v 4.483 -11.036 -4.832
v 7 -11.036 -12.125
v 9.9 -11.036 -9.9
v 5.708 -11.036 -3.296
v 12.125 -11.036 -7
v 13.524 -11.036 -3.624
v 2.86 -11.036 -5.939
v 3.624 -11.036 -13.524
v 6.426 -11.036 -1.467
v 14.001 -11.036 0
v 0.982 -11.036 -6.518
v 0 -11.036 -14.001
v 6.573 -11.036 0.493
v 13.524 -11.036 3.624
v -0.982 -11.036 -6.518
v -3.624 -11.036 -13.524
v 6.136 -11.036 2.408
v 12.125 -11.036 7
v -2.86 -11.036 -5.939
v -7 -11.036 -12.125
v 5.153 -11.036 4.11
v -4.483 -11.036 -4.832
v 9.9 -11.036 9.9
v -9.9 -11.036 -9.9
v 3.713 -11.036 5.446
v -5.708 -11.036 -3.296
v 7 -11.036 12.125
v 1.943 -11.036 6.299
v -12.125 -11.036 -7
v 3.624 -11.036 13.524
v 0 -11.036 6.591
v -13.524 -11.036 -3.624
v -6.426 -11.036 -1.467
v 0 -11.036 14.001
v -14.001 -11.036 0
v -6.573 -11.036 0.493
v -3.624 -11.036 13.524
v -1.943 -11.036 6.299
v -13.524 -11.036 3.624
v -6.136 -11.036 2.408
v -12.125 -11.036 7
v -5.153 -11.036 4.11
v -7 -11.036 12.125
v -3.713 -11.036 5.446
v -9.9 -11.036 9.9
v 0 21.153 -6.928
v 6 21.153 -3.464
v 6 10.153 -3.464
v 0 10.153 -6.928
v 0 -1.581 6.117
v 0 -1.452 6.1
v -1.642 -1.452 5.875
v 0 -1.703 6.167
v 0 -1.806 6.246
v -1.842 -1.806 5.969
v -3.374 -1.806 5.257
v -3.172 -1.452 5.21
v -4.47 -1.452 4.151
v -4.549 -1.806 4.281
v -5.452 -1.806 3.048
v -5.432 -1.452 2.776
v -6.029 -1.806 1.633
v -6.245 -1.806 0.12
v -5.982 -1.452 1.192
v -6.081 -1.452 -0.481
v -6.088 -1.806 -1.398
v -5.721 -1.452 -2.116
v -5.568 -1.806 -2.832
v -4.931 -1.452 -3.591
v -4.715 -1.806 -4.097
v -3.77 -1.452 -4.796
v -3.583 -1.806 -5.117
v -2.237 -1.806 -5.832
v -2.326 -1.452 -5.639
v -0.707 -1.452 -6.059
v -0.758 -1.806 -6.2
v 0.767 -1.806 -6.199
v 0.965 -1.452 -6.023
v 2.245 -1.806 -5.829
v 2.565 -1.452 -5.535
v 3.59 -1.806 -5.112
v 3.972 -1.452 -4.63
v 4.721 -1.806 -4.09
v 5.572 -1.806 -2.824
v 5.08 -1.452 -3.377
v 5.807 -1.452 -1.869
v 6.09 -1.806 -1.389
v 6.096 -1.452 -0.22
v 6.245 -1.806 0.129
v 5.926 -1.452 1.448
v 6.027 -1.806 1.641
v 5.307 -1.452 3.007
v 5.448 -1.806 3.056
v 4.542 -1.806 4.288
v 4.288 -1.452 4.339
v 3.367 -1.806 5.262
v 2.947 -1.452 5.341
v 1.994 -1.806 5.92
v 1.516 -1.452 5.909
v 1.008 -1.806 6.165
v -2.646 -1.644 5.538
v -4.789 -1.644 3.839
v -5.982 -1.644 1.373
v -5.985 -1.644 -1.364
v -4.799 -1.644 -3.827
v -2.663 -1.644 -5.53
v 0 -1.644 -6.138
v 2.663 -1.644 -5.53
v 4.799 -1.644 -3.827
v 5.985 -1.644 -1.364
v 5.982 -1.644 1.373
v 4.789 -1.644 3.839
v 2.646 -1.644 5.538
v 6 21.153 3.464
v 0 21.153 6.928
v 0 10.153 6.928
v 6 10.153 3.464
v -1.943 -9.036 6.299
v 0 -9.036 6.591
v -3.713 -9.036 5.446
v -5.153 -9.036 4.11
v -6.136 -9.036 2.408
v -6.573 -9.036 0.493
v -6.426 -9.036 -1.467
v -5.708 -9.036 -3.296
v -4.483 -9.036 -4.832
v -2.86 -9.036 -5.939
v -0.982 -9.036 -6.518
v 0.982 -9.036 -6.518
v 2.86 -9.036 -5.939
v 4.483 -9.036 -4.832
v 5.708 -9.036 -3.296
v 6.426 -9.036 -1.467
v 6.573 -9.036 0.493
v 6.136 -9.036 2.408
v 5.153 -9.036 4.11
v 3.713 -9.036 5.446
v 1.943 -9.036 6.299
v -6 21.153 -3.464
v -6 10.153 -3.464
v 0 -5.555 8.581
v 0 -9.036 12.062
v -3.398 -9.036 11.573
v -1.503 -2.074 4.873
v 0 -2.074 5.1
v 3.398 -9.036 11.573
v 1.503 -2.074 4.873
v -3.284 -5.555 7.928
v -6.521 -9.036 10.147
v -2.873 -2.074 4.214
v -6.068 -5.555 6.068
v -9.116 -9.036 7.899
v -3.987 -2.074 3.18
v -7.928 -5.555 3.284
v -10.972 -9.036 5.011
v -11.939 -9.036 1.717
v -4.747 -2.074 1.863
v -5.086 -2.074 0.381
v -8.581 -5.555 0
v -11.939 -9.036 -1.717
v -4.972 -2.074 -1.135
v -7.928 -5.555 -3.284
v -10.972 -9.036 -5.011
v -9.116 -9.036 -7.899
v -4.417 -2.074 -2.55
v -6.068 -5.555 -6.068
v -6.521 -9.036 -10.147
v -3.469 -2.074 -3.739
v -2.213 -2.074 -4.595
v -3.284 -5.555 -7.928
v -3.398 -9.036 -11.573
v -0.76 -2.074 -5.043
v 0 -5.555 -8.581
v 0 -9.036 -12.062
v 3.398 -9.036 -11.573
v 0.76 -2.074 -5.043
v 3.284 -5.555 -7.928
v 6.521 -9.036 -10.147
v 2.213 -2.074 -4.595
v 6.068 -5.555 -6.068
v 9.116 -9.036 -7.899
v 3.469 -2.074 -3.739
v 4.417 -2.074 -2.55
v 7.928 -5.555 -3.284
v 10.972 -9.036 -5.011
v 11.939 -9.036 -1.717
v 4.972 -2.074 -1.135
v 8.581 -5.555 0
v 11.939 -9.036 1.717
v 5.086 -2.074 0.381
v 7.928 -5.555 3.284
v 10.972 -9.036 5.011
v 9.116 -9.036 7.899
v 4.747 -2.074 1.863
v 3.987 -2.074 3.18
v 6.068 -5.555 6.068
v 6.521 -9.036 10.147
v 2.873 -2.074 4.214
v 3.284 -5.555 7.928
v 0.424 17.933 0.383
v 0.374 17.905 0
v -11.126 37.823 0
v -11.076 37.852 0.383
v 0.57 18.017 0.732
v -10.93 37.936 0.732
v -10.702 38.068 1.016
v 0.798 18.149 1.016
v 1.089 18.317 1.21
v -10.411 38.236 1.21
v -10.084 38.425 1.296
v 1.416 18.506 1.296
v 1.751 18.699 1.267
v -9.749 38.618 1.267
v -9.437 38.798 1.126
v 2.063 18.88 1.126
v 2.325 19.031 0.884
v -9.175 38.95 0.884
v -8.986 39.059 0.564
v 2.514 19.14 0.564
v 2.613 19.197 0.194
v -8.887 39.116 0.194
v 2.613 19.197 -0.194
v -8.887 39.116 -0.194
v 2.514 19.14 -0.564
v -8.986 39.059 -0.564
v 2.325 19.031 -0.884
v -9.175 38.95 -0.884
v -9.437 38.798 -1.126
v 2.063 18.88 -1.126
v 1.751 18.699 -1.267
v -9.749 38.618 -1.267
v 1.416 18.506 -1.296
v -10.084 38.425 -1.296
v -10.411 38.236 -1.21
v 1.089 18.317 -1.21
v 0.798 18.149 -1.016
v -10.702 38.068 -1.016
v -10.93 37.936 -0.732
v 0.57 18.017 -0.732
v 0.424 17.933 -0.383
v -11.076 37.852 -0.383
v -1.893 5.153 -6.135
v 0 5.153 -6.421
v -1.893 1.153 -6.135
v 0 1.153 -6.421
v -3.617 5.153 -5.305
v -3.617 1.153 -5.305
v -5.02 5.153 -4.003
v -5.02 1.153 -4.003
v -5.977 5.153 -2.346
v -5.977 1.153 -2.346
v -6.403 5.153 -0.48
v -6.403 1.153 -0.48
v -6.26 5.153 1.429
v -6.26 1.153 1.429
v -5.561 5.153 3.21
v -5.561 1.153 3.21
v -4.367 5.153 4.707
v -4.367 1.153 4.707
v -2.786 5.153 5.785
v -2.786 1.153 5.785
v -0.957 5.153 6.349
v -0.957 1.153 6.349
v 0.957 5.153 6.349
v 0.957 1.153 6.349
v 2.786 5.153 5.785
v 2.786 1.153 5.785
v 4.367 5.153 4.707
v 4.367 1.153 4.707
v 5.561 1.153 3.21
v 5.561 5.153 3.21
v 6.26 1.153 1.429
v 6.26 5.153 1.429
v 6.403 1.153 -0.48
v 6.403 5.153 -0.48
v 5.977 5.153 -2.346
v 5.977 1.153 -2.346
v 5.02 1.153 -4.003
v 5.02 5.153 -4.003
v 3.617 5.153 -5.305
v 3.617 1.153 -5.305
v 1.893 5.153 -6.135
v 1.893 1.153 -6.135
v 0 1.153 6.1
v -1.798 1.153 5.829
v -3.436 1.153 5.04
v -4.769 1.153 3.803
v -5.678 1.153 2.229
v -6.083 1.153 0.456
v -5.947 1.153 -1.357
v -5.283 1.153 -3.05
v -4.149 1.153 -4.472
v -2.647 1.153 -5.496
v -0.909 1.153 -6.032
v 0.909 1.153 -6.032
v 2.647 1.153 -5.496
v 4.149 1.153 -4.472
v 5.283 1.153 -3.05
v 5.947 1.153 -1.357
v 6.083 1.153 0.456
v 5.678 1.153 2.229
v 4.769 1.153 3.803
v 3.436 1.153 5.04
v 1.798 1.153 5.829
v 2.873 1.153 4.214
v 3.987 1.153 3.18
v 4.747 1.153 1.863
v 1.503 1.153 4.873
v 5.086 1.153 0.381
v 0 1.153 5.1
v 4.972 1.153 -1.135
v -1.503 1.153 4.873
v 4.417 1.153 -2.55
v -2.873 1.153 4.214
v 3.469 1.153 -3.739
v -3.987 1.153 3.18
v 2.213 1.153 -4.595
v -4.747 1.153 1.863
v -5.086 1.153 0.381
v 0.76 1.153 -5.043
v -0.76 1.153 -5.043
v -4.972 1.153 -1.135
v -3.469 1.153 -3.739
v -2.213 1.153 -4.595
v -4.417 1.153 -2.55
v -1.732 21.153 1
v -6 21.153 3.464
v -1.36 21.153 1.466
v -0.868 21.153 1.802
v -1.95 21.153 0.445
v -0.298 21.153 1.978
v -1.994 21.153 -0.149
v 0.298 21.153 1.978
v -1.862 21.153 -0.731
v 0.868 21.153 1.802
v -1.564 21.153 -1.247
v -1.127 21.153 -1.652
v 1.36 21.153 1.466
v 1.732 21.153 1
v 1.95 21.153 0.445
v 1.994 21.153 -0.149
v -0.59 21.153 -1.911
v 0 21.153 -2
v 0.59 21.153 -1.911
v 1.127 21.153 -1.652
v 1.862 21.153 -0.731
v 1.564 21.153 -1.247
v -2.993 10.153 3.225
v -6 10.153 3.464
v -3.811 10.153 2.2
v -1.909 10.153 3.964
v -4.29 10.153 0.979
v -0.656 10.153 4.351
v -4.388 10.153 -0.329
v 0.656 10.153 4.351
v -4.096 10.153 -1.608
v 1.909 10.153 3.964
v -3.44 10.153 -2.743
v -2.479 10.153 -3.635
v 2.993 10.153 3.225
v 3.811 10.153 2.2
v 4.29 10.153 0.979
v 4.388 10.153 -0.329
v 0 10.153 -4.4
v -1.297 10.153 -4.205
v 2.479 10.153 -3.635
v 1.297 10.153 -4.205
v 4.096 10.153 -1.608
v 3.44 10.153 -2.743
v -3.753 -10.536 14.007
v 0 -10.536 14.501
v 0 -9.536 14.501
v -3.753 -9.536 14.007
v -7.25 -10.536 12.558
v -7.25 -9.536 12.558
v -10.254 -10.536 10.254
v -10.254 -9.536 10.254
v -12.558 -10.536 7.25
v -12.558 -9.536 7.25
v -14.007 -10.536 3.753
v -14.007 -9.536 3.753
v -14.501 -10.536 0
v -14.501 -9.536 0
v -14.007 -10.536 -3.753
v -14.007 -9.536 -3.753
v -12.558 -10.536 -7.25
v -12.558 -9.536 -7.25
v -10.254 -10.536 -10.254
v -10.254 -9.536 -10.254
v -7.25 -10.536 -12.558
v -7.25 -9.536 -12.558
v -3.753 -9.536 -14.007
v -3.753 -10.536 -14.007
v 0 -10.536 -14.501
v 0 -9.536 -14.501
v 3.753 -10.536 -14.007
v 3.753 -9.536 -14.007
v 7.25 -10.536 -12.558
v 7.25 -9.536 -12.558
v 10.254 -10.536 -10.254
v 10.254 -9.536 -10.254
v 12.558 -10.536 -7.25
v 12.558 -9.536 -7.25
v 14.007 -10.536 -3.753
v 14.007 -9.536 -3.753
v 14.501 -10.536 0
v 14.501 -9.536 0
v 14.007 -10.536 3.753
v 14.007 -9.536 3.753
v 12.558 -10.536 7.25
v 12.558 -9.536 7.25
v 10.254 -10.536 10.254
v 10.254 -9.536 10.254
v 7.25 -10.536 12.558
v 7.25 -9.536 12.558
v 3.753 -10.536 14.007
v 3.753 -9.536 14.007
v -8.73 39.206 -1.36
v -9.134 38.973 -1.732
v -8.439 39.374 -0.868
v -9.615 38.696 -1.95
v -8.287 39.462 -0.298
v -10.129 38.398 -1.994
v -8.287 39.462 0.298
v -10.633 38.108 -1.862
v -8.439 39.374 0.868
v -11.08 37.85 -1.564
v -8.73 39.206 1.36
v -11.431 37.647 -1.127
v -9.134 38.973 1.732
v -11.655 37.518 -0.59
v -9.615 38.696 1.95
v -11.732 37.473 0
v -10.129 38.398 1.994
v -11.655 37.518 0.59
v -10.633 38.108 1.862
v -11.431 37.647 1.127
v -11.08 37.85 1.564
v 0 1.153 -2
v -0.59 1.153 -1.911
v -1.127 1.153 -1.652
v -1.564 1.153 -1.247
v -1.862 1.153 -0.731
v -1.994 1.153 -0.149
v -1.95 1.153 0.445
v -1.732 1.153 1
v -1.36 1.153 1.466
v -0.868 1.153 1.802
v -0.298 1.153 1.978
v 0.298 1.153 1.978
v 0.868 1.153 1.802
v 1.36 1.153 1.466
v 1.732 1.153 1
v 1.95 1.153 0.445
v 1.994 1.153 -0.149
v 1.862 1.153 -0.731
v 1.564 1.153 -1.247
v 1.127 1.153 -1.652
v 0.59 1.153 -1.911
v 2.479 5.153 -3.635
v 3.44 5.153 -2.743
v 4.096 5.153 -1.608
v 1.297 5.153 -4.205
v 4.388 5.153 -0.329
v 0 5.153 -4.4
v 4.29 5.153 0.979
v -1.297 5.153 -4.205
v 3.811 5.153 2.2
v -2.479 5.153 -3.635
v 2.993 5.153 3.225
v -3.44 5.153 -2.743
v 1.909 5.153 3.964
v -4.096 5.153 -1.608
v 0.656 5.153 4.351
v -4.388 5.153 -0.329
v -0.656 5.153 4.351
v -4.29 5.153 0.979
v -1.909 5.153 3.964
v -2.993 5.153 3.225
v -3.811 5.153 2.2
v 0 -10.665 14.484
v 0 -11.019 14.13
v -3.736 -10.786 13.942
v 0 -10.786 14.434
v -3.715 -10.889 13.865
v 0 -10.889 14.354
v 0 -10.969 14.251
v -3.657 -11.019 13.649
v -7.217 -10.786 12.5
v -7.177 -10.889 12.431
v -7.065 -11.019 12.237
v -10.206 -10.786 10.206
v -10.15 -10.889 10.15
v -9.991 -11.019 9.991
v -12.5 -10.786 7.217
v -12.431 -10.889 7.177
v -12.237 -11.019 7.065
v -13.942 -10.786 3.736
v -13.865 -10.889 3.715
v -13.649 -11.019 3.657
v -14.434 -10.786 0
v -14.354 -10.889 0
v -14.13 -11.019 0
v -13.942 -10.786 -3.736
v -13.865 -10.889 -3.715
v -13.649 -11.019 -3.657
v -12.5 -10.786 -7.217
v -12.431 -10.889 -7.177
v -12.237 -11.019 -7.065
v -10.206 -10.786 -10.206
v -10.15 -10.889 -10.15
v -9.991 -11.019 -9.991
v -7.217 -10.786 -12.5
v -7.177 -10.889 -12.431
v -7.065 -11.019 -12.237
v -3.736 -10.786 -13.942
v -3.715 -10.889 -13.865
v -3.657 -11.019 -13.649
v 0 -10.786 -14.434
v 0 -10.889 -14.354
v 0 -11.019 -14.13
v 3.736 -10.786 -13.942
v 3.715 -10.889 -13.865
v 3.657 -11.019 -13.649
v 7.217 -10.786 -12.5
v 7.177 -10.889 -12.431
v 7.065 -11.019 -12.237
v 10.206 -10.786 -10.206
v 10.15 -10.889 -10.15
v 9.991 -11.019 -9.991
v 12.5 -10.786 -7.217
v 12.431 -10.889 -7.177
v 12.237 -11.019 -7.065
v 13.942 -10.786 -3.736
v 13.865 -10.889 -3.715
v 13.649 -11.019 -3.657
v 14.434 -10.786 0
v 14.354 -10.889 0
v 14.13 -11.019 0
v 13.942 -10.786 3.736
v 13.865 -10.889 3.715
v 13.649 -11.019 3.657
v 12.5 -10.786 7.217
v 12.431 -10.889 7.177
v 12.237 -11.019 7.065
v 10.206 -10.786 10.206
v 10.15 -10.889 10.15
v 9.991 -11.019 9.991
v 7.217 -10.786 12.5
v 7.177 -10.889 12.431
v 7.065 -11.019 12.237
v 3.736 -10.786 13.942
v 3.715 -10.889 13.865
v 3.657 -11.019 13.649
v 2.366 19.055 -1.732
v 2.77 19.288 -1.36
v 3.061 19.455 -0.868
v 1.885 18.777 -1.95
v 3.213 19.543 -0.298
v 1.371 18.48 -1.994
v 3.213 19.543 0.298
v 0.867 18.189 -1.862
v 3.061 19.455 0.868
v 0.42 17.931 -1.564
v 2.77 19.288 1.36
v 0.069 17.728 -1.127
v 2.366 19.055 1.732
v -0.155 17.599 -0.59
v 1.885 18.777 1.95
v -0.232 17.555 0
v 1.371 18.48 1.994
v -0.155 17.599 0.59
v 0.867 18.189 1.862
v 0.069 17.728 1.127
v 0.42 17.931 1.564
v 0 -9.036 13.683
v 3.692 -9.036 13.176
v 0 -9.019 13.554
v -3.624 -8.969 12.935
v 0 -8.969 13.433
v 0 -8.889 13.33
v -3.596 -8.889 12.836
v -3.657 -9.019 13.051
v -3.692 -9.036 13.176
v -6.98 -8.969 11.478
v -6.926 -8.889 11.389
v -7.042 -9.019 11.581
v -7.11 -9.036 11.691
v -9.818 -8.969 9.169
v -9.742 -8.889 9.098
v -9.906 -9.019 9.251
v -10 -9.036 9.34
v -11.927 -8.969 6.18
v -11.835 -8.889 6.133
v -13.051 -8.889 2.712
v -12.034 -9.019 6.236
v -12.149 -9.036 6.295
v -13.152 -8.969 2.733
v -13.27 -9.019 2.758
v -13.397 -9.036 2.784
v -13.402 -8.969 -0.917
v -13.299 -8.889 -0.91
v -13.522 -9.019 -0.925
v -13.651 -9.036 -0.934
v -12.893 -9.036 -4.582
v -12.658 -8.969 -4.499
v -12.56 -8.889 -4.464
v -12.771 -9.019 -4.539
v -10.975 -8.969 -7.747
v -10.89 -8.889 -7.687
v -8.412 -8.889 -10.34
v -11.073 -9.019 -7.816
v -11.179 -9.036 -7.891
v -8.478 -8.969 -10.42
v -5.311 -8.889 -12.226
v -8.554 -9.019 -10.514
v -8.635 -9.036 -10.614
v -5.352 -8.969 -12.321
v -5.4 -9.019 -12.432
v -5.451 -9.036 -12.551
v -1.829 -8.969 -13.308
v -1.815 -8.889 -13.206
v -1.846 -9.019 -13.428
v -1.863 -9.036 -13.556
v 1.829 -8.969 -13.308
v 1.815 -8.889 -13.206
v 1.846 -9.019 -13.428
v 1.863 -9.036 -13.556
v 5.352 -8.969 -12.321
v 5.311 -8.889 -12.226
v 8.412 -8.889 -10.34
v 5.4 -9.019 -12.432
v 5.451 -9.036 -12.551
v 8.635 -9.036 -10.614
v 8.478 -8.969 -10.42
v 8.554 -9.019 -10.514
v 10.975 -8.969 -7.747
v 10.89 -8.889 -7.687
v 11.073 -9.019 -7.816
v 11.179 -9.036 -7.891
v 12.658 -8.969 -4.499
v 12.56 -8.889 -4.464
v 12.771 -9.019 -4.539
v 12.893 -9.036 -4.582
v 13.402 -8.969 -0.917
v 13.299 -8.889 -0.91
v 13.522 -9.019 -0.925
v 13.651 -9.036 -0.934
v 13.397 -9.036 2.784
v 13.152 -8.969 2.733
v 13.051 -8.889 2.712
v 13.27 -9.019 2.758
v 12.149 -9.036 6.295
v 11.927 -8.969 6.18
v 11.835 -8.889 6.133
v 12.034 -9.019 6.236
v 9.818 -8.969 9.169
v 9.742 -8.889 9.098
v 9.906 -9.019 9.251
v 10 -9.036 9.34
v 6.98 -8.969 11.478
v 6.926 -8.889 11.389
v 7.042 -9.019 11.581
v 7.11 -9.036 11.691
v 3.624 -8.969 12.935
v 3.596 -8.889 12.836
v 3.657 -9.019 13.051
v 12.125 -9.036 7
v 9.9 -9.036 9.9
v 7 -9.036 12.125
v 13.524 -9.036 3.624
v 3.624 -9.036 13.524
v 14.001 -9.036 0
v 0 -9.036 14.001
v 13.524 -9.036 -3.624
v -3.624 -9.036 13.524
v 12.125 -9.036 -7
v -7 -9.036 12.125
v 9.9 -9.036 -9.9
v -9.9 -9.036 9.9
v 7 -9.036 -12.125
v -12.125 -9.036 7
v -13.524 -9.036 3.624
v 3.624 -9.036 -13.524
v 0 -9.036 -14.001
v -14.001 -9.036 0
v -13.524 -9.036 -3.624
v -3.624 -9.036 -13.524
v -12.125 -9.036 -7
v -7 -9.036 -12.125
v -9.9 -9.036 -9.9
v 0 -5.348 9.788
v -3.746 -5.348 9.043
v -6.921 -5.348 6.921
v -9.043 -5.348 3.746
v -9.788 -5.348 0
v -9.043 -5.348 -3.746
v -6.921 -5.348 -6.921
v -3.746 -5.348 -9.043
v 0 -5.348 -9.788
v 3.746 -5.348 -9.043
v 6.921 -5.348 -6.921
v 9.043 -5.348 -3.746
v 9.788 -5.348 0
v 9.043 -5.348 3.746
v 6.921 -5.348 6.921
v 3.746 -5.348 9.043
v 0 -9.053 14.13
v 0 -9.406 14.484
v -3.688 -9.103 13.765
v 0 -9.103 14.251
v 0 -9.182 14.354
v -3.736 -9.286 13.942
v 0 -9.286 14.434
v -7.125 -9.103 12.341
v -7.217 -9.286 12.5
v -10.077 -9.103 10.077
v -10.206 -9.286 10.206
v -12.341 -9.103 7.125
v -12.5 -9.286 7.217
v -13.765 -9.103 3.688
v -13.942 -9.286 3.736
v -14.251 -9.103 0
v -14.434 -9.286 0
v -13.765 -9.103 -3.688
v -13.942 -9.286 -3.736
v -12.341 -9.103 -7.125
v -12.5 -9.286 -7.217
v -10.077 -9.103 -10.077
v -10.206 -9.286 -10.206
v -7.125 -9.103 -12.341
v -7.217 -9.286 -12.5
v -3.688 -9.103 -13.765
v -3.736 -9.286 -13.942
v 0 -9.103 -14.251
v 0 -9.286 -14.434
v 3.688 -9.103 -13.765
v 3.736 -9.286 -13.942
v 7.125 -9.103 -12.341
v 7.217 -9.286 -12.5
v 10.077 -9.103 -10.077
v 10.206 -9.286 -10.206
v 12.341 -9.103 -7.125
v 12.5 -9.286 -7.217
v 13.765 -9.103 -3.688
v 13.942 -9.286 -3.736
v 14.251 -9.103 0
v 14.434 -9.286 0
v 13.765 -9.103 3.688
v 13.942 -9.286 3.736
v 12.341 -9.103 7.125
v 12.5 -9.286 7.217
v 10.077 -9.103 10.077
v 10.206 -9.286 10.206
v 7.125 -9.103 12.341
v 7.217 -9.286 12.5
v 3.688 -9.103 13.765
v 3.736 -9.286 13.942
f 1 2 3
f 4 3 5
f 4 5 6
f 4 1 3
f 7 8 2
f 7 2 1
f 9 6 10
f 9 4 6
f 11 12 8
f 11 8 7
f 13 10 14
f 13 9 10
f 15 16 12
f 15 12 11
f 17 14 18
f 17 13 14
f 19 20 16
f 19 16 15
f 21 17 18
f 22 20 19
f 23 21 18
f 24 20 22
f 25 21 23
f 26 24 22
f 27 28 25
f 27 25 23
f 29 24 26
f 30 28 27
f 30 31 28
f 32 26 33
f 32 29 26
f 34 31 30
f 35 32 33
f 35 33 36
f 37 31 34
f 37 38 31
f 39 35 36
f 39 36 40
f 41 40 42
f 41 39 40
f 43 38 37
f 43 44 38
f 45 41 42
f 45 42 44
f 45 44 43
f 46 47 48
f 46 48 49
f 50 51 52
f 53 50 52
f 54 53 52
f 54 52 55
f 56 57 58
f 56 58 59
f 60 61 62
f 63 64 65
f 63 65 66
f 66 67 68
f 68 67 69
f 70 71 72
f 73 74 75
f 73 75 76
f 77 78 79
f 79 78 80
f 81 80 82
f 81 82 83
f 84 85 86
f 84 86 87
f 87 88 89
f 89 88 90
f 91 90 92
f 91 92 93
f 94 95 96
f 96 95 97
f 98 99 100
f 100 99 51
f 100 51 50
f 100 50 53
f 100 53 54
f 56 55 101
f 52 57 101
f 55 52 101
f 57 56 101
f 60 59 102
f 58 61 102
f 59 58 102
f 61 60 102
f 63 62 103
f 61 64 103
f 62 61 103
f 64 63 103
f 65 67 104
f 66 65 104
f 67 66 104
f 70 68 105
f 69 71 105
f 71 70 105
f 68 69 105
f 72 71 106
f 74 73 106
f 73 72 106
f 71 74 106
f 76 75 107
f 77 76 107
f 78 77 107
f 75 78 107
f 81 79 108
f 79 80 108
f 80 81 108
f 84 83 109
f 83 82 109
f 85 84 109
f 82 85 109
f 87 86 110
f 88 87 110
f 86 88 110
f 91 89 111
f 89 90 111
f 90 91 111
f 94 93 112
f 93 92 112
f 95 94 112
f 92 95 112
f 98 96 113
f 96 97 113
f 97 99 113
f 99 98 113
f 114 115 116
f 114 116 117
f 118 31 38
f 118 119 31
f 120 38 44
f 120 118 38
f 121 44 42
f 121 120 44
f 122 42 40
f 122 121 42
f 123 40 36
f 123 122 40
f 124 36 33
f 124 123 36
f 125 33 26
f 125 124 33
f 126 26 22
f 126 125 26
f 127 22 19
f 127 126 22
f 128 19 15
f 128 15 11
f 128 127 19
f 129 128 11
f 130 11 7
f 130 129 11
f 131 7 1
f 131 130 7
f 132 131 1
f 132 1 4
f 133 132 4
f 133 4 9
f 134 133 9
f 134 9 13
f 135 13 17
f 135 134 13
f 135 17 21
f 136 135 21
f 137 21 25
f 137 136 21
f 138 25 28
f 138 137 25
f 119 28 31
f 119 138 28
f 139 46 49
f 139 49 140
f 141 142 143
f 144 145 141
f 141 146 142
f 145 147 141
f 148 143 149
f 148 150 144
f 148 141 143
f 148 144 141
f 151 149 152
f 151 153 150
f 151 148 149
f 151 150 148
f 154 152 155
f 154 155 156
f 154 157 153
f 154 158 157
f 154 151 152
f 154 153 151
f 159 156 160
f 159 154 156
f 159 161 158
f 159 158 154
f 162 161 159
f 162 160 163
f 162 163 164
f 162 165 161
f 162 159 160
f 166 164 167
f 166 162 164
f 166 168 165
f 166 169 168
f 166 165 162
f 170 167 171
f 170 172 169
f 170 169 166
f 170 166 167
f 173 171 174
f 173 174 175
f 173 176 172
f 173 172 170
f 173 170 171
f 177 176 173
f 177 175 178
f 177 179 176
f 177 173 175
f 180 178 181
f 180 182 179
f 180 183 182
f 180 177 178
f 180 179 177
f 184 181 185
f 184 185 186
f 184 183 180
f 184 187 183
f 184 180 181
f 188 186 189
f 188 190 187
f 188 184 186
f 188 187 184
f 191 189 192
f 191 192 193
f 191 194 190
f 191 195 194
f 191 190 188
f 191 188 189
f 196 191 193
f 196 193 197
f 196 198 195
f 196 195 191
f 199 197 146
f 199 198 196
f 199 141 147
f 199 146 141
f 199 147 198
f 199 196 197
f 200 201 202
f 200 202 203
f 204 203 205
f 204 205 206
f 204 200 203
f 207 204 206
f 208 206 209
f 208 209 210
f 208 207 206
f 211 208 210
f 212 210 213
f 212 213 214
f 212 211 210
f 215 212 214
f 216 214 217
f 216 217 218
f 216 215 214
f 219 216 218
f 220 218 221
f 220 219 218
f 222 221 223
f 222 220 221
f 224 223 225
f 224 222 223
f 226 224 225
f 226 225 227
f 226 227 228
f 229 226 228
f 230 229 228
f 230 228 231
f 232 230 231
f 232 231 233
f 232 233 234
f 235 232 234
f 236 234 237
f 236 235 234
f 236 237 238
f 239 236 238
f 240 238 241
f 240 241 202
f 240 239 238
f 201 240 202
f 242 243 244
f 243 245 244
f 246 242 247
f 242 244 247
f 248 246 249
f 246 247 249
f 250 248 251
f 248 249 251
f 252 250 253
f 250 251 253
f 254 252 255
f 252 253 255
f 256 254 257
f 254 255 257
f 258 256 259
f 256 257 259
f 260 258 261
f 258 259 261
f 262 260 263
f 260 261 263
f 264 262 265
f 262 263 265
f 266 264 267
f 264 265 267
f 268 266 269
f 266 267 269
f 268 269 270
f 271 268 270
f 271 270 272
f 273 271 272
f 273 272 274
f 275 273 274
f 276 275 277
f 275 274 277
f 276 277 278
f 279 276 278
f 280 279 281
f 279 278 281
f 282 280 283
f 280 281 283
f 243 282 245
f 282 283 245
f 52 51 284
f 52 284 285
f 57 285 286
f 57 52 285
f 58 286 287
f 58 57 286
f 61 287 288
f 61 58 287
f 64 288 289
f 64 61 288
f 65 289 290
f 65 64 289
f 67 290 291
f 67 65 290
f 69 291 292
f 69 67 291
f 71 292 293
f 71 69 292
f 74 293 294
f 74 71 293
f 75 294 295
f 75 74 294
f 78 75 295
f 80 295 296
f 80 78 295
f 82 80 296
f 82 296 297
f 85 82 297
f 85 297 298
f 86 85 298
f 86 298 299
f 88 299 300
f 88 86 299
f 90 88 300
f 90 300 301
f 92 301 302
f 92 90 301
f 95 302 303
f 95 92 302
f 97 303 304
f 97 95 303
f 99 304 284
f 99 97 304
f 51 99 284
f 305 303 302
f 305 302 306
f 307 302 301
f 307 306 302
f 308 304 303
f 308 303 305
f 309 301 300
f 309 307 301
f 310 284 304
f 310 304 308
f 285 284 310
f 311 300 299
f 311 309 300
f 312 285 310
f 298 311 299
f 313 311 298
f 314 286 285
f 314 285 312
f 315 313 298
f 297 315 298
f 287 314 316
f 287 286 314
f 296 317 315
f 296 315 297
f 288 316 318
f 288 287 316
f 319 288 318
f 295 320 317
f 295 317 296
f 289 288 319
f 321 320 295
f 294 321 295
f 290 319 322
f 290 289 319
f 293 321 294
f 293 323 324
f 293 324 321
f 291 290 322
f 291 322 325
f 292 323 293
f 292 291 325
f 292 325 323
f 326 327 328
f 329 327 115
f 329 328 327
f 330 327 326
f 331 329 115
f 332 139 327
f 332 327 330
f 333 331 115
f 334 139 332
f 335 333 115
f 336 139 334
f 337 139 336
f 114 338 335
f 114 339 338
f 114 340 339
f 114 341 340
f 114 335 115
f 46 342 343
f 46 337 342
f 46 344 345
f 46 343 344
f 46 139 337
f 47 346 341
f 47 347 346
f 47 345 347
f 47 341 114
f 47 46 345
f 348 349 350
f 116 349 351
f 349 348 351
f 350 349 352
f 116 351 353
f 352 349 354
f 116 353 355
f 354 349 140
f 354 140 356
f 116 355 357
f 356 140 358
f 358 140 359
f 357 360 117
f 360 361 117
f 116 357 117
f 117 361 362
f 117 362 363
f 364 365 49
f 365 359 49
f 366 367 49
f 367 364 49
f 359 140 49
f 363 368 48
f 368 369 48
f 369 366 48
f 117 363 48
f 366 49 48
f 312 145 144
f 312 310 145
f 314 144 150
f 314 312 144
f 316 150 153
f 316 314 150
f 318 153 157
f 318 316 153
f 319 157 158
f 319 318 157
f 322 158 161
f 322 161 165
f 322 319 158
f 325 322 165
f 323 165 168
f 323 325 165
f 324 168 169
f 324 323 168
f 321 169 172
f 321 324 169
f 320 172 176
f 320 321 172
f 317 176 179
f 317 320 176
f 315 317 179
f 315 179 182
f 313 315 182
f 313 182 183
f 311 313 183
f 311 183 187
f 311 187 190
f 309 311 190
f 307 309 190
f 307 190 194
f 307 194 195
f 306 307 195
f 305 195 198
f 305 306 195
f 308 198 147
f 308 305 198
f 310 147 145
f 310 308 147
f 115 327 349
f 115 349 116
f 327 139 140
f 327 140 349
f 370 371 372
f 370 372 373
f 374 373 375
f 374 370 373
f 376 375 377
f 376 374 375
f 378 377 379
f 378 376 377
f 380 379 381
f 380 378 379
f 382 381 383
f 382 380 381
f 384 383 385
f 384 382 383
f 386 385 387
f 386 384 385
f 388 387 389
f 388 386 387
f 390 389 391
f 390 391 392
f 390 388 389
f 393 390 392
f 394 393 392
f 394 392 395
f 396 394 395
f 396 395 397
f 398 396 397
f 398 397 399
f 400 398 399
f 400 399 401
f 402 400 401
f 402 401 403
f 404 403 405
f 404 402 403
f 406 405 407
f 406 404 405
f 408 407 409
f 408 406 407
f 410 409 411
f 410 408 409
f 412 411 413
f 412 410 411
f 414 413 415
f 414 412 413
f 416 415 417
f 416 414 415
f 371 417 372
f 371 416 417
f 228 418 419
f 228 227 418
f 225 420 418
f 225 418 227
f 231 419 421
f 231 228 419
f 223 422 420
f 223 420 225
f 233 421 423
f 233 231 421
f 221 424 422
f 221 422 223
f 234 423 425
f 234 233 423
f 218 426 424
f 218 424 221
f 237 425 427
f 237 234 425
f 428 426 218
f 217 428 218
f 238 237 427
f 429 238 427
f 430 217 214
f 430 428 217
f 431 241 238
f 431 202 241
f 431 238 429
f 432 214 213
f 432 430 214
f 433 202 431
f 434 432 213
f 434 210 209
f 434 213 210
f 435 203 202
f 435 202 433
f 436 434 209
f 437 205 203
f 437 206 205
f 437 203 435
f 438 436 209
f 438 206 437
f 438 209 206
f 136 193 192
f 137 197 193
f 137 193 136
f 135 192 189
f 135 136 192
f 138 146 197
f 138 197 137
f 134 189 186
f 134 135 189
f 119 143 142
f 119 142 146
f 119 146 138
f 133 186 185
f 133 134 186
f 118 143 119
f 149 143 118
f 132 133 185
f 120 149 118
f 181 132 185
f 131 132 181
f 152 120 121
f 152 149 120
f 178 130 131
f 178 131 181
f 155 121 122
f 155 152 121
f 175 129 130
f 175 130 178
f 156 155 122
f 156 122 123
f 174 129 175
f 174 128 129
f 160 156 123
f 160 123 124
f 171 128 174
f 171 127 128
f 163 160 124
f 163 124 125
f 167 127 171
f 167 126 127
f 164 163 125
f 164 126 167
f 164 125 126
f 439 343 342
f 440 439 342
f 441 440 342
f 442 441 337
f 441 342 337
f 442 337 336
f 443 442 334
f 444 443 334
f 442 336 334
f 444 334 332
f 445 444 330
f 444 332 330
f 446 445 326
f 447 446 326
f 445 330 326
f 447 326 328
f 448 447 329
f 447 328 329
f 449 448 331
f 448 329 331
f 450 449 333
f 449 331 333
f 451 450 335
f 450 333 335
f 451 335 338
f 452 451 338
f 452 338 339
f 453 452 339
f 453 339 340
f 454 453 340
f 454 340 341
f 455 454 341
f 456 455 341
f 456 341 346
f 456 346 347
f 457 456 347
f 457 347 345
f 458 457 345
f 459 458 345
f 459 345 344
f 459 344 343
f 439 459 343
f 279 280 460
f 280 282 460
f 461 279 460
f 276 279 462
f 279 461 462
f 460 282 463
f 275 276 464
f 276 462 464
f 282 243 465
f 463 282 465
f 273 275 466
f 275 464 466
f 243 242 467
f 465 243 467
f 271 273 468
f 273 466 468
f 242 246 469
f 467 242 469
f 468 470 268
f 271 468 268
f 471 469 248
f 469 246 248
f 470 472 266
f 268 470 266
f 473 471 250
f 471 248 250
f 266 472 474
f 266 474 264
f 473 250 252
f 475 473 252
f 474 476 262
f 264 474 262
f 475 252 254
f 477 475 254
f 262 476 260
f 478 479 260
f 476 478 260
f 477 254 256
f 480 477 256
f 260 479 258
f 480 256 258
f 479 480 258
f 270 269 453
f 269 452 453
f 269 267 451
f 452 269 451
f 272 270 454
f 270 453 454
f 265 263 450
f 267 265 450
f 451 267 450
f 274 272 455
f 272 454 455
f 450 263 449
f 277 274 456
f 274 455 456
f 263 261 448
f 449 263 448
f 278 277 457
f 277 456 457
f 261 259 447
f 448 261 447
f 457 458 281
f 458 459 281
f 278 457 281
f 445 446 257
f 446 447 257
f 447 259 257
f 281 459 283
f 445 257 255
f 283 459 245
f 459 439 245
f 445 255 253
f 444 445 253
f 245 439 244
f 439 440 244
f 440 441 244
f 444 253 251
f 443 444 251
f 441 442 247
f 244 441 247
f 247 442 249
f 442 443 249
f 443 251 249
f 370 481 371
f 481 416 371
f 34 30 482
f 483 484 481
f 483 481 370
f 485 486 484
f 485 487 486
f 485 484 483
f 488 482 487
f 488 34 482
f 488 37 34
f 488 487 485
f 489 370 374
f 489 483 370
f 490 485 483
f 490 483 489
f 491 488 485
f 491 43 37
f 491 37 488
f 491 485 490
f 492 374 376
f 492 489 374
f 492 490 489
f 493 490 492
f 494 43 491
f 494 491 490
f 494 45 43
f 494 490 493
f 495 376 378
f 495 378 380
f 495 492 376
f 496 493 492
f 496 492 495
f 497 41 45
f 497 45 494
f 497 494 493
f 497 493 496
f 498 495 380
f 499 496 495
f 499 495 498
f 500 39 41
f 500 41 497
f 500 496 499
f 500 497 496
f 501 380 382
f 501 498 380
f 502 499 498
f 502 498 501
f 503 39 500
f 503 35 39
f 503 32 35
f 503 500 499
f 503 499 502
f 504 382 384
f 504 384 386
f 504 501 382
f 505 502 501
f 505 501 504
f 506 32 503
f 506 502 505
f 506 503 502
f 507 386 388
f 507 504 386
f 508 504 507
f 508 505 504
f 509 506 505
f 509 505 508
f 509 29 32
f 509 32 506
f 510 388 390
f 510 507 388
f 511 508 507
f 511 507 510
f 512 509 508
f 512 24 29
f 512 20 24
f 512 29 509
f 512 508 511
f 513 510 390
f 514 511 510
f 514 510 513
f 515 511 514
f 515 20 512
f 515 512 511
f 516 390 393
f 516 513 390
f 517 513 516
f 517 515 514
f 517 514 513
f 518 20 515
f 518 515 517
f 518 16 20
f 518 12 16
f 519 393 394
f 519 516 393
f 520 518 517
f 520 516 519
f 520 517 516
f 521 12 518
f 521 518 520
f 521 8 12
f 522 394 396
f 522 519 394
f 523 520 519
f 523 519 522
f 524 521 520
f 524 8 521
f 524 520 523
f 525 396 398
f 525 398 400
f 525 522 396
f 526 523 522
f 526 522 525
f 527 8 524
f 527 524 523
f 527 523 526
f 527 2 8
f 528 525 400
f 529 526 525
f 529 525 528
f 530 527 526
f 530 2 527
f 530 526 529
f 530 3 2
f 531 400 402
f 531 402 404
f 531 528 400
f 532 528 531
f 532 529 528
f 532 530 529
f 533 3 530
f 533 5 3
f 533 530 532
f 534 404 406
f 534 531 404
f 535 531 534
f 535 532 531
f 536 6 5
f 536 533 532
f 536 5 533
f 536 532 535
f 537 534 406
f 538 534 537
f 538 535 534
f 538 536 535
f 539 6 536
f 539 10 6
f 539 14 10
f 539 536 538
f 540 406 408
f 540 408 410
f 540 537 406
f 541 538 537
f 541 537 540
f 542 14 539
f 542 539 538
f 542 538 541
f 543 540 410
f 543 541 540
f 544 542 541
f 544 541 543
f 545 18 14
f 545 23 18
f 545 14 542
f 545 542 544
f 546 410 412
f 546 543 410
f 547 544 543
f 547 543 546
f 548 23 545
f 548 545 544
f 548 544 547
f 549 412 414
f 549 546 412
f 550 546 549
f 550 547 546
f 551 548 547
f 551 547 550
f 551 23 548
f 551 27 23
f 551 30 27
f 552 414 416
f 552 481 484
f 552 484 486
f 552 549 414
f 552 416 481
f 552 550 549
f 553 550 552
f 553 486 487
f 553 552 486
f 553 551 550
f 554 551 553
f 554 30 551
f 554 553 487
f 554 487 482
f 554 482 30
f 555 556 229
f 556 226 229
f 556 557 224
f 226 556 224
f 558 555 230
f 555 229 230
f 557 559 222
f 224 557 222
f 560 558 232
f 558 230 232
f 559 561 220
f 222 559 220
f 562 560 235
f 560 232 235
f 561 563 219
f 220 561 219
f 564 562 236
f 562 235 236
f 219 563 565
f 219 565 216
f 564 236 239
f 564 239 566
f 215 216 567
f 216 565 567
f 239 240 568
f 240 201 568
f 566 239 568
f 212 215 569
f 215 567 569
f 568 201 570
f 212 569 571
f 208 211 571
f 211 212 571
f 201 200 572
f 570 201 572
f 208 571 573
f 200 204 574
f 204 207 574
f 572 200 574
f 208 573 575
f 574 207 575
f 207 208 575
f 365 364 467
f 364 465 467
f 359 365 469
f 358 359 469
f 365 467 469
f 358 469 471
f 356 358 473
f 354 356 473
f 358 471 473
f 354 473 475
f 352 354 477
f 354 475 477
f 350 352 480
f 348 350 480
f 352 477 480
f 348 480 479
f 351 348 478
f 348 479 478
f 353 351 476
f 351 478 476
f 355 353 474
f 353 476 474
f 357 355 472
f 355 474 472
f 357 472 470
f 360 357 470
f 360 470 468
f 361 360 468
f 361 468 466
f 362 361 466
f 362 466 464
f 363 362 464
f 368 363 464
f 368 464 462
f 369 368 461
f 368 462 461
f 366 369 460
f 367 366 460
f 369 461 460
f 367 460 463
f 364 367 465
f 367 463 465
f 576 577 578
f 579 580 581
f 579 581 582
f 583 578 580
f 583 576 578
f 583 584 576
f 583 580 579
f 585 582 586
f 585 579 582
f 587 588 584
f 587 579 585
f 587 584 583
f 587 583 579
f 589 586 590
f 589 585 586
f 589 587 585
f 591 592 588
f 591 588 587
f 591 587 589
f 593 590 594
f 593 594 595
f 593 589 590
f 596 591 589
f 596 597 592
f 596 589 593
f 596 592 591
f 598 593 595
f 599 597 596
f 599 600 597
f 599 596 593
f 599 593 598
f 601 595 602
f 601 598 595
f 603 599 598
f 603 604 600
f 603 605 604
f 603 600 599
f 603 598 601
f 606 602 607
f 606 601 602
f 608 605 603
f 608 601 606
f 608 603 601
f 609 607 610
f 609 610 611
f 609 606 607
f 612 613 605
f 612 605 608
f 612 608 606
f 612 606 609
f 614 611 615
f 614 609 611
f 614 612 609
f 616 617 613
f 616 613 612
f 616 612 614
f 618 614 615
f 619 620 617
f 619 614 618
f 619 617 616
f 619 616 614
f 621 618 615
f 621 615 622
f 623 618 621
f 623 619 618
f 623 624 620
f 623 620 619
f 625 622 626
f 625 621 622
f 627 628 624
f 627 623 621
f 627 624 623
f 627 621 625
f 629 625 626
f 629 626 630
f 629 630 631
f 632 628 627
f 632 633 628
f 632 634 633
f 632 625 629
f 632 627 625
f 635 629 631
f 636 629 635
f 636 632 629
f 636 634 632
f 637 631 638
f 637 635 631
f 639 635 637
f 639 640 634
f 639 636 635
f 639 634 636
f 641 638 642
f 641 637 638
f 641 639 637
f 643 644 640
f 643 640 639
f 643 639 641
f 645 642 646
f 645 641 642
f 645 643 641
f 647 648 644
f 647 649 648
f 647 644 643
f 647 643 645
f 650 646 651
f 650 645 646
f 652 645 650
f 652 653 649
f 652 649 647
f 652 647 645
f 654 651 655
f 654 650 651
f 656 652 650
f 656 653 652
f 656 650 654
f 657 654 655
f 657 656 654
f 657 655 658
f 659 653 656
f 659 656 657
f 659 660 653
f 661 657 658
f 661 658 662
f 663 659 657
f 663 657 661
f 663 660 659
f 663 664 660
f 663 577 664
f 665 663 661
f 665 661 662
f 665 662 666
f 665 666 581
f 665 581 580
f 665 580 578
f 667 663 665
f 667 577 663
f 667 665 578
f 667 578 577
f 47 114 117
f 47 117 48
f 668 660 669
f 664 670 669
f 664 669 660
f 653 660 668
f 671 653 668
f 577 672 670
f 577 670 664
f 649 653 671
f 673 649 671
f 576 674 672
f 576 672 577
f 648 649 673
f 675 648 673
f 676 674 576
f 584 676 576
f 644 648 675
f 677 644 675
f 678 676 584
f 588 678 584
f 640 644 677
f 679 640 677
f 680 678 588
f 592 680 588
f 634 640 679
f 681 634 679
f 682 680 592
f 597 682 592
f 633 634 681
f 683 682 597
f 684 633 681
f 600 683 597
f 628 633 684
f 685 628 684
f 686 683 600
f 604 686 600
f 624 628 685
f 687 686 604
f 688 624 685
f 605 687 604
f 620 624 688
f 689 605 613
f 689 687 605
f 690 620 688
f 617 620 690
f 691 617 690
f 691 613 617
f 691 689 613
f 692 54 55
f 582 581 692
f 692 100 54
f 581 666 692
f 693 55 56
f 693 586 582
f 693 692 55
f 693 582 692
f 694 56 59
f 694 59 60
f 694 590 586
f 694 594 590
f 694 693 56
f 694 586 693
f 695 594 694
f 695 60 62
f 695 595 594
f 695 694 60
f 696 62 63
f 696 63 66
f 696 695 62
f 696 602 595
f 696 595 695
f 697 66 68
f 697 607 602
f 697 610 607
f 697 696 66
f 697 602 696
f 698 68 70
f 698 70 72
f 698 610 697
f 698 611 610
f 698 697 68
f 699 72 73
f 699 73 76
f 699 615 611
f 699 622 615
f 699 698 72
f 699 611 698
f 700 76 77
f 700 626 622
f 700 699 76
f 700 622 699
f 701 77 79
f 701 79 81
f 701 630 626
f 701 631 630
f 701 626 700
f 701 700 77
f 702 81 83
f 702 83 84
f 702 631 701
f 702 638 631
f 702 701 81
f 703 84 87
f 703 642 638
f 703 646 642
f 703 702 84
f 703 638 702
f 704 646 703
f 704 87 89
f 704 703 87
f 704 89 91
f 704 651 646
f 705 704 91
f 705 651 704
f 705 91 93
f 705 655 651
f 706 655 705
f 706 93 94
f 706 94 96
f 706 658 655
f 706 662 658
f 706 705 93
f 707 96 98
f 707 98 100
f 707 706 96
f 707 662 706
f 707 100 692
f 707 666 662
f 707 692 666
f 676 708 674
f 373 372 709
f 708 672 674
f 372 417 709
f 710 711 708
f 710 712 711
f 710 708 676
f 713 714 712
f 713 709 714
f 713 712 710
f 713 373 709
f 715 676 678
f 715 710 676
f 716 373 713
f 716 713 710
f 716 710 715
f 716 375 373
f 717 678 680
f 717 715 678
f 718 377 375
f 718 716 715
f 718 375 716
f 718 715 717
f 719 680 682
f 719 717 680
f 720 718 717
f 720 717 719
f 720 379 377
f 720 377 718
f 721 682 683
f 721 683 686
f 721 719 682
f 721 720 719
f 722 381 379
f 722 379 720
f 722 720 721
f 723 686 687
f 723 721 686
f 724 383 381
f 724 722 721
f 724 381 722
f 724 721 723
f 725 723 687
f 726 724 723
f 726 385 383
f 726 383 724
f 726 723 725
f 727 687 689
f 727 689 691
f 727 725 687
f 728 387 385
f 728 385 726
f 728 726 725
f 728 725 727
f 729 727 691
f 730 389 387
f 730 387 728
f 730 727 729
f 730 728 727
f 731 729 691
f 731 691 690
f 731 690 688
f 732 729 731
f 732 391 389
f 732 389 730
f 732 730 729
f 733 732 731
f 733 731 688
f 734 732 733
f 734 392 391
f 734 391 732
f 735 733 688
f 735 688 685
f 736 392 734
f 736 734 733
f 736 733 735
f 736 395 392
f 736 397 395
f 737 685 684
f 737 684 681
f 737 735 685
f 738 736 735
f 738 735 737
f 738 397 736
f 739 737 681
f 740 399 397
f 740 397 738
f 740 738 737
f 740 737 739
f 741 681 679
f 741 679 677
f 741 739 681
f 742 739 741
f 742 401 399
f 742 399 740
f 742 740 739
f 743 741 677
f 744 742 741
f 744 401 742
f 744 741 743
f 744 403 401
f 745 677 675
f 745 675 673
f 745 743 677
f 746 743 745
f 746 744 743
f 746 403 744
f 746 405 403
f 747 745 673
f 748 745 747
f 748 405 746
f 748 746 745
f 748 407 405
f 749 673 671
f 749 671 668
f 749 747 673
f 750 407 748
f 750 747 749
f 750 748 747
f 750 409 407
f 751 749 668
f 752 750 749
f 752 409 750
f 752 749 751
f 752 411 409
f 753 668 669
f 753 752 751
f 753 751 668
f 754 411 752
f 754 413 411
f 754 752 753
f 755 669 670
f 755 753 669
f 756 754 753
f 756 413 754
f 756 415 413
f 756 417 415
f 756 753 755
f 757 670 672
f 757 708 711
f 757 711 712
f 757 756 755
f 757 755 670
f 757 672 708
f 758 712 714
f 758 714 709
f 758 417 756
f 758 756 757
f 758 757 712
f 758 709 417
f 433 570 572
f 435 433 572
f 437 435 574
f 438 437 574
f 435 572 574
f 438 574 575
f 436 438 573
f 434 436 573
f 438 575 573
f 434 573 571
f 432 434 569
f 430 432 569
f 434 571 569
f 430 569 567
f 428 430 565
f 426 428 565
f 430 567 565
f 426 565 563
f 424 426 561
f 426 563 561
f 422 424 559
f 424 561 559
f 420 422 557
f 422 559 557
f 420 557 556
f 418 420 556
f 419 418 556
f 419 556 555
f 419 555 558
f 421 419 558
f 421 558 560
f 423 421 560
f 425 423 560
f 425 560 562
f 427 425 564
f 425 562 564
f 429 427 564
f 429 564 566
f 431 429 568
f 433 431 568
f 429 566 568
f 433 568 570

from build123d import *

# Parameters (mm, degrees)
CONG_1_R                = 0.5
BOSS_EXTRU_1_START      = 11
ESQUISSE3_R             = 2
BOSS_EXTRU_1_DEPTH      = 11
BOSS_EXTRU_3_DEPTH      = 20
BOSS_EXTRU_3_DEPTH_BACK = 3
ESQUISSE5_R             = 2
ESQUISSE5_R_2           = 1.3


with BuildPart() as part:
    # Esquisse1 → Révolution1 (revolve)
    with BuildSketch(Plane.XY, mode=Mode.PRIVATE) as r_volution1_sk:
        Polygon((4.4, 10.152592593), (4.4, 5.152592593), (6.420740741, 5.152592593), (6.420740741, 1.152592593), (2, 1.152592593), (2, 10.152592593), align=None)
    revolve(r_volution1_sk.sketch.rotate(Axis((0, 1.898518519, 0), (0, 1, 0)), 90), axis=Axis((0, 1.898518519, 0), (0, 1, 0)))

    # Esquisse3 → Boss.-Extru.1 (add)
    with BuildSketch(Plane(origin=(0, 10.152592593, 0), x_dir=(1, 0, 0), z_dir=(0, 1, 0)).offset(BOSS_EXTRU_1_START)):
        Polygon((6, 3.464101615), (0, 6.92820323), (-6, 3.464101615), (-6, -3.464101615), (0, -6.92820323), (6, -3.464101615), align=None)
        with Locations(Location((0, 0, 0), (0, 0, 90))):
            Circle(ESQUISSE3_R, mode=Mode.SUBTRACT)
    extrude(amount=-BOSS_EXTRU_1_DEPTH)


with BuildPart() as body_2:
    # Esquisse2 → Révolution2 (revolve)
    with BuildSketch(Plane.XY, mode=Mode.PRIVATE) as r_volution2_sk:
        Polygon((6.1, 1.152592593), (6.1, -1.659551209), (13.476266742, -9.035817951), (14.500695366, -9.035817951), (14.500695366, -11.035817951), (6.591394886, -11.035817951), (6.591394886, -9.035817951), (12.06205318, -9.035817951), (5.1, -2.073764772), (5.1, 1.152592593), align=None)
    revolve(r_volution2_sk.sketch.rotate(Axis((0, 10.152592593, 0), (0, -1, 0)), 90), axis=Axis((0, 10.152592593, 0), (0, -1, 0)))

    # Congé1
    cong_1_edges = [body_2.edges().sort_by_distance(p)[0] for p in [
        (0, -9.035817951, -13.476266742),
        (0, -1.659551209, -6.1),
        (0, -11.035817951, -14.500695366),
        (0, -9.035817951, -14.500695366),
    ]]
    fillet(cong_1_edges, radius=CONG_1_R)


with BuildPart() as body_3:
    # Esquisse5 → Boss.-Extru.3 (new, two sides: drawn at the far end of the back side and taken through both)
    with BuildSketch(Plane(origin=(0, 21.152592593, 0), x_dir=(0.8660254037844362, 0.5000000000000042, 0), z_dir=(-0.5000000000000043, 0.8660254037844363, 0)).offset(-BOSS_EXTRU_3_DEPTH_BACK)):
        with Locations(Location((0, 0, 0), (0, 0, 180))):
            Circle(ESQUISSE5_R)
        with Locations(Location((0, 0, 0), (0, 0, 180))):
            Circle(ESQUISSE5_R_2, mode=Mode.SUBTRACT)
    extrude(amount=BOSS_EXTRU_3_DEPTH + BOSS_EXTRU_3_DEPTH_BACK)


solid = Compound([part.part, body_2.part, body_3.part])
